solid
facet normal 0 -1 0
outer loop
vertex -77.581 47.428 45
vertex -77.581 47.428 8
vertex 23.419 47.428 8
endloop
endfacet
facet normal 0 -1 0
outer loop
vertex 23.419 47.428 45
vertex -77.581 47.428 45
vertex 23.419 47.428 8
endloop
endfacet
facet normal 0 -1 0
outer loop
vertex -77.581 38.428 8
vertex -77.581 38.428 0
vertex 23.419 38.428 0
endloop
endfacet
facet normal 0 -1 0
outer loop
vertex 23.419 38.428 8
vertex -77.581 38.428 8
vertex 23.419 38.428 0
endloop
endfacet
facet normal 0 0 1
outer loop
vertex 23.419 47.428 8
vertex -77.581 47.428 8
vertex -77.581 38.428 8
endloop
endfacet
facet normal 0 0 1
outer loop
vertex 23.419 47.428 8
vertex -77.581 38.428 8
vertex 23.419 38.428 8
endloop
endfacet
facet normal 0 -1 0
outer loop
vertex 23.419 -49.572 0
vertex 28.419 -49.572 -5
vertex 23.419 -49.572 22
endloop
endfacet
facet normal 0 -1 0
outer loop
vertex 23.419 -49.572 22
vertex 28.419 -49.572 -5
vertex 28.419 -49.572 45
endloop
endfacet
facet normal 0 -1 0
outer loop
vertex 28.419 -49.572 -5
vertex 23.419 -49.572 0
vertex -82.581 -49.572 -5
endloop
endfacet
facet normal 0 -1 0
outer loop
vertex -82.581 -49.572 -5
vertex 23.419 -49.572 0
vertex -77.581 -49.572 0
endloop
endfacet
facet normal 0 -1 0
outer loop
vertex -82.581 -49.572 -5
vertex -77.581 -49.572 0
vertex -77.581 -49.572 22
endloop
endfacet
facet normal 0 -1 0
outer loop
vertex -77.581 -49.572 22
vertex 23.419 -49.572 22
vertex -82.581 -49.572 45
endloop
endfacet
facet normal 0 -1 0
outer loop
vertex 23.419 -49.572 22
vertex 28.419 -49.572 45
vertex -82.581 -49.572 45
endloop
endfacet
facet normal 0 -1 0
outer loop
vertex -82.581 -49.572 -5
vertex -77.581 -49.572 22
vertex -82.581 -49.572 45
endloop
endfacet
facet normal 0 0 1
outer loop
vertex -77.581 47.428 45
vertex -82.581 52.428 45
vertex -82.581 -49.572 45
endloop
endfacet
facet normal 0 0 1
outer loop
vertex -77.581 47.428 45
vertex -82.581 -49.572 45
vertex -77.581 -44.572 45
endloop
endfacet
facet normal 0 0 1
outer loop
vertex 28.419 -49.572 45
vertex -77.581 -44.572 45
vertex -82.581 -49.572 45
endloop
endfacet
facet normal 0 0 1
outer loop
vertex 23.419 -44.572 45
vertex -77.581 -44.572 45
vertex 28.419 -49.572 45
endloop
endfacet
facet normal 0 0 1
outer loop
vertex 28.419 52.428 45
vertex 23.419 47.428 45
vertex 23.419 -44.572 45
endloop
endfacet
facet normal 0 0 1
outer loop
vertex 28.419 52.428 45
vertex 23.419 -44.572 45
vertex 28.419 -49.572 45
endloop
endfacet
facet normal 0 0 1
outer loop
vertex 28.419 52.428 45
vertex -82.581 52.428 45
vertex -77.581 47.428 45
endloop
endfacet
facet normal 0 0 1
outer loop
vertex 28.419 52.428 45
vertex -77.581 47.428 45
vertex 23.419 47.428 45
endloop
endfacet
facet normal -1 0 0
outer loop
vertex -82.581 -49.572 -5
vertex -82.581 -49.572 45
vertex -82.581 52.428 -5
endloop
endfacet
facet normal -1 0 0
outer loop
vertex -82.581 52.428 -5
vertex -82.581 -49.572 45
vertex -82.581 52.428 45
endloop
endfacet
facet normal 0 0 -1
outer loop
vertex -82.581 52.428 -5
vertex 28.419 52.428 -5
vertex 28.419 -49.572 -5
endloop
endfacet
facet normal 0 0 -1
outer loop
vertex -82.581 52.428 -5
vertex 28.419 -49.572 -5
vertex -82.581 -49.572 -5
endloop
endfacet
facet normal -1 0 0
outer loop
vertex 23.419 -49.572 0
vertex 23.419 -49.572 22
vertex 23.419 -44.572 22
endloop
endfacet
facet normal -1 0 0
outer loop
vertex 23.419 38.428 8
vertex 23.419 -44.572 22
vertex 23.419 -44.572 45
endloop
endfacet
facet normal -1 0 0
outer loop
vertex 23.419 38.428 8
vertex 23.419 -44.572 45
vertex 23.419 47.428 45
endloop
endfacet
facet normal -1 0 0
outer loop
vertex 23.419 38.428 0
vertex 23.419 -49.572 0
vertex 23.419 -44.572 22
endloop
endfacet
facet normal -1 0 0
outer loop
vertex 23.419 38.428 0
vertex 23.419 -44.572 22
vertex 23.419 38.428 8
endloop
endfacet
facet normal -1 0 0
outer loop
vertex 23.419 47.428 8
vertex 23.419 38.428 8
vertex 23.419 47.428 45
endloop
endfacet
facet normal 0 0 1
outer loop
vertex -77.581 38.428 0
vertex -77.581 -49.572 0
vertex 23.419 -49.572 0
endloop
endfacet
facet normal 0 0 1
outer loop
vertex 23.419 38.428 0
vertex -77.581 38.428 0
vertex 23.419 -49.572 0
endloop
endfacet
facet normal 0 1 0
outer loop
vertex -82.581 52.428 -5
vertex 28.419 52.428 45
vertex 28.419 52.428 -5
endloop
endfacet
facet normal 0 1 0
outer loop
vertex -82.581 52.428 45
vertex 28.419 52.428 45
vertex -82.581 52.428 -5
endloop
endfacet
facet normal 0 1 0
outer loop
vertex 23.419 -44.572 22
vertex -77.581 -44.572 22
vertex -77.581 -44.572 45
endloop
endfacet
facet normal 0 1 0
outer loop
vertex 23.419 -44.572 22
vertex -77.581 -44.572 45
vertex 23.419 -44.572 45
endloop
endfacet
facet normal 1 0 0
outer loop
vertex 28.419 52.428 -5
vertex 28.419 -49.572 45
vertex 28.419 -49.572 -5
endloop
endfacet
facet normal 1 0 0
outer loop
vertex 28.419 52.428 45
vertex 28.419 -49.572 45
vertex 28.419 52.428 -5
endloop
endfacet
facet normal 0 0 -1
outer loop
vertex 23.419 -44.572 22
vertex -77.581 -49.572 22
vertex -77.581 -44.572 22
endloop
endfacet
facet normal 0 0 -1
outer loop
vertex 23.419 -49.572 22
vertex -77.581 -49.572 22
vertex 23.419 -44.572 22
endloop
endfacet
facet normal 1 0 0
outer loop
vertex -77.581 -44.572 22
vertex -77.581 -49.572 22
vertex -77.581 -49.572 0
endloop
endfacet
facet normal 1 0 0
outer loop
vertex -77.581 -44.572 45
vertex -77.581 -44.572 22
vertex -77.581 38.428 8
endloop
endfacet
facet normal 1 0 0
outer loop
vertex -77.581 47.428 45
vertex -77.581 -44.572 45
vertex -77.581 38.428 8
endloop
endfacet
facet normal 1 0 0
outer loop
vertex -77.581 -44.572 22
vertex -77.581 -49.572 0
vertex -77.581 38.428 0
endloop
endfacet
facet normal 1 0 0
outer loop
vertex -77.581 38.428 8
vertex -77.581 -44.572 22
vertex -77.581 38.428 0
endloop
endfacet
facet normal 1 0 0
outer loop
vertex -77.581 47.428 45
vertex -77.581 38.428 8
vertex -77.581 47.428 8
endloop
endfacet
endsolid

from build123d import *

# Parameters (mm, degrees)
SKETCH_1_W          = 111
SKETCH_1_H          = 102
SKETCH_1_W_2        = 101
SKETCH_1_H_2        = 92
EXTRUDE_1_DEPTH     = 45
SKETCH_2_W          = 111
SKETCH_2_H          = 102
EXTRUDE_2_DEPTH     = 5
SKETCH_3_W          = 101
SKETCH_3_H          = 22
CUT_EXTRUDE_4_DEPTH = 5
SKETCH_4_W          = 101
SKETCH_4_H          = 9
EXTRUDE_3_DEPTH     = 8


with BuildPart() as part:
    # 草圖1 → 填料-伸長1 (new body)
    with BuildSketch(Plane.XY):
        with Locations((-27.081120075, 1.427877732)):
            Rectangle(SKETCH_1_W, SKETCH_1_H)
        with Locations((-27.081120075, 1.427877732)):
            Rectangle(SKETCH_1_W_2, SKETCH_1_H_2, mode=Mode.SUBTRACT)
    extrude(amount=EXTRUDE_1_DEPTH)

    # 草圖2 → 填料-伸長2 (add)
    with BuildSketch(Plane(origin=(0, 0, 0), x_dir=(-1, 0, 0), z_dir=(0, 0, -1))):
        with Locations((27.081120075, 1.427877732)):
            Rectangle(SKETCH_2_W, SKETCH_2_H)
    extrude(amount=EXTRUDE_2_DEPTH)

    # 草圖3 → 除料-伸長4 (cut)
    with BuildSketch(Plane.XZ.offset(49.572122268)):
        with Locations((-27.081120075, 11)):
            Rectangle(SKETCH_3_W, SKETCH_3_H)
    extrude(amount=-CUT_EXTRUDE_4_DEPTH, mode=Mode.SUBTRACT)

    # 草圖4 → 填料-伸長3 (add)
    with BuildSketch(Plane.XY):
        with Locations((-27.081120075, 42.927877732)):
            Rectangle(SKETCH_4_W, SKETCH_4_H)
    extrude(amount=EXTRUDE_3_DEPTH)


solid = part.part
